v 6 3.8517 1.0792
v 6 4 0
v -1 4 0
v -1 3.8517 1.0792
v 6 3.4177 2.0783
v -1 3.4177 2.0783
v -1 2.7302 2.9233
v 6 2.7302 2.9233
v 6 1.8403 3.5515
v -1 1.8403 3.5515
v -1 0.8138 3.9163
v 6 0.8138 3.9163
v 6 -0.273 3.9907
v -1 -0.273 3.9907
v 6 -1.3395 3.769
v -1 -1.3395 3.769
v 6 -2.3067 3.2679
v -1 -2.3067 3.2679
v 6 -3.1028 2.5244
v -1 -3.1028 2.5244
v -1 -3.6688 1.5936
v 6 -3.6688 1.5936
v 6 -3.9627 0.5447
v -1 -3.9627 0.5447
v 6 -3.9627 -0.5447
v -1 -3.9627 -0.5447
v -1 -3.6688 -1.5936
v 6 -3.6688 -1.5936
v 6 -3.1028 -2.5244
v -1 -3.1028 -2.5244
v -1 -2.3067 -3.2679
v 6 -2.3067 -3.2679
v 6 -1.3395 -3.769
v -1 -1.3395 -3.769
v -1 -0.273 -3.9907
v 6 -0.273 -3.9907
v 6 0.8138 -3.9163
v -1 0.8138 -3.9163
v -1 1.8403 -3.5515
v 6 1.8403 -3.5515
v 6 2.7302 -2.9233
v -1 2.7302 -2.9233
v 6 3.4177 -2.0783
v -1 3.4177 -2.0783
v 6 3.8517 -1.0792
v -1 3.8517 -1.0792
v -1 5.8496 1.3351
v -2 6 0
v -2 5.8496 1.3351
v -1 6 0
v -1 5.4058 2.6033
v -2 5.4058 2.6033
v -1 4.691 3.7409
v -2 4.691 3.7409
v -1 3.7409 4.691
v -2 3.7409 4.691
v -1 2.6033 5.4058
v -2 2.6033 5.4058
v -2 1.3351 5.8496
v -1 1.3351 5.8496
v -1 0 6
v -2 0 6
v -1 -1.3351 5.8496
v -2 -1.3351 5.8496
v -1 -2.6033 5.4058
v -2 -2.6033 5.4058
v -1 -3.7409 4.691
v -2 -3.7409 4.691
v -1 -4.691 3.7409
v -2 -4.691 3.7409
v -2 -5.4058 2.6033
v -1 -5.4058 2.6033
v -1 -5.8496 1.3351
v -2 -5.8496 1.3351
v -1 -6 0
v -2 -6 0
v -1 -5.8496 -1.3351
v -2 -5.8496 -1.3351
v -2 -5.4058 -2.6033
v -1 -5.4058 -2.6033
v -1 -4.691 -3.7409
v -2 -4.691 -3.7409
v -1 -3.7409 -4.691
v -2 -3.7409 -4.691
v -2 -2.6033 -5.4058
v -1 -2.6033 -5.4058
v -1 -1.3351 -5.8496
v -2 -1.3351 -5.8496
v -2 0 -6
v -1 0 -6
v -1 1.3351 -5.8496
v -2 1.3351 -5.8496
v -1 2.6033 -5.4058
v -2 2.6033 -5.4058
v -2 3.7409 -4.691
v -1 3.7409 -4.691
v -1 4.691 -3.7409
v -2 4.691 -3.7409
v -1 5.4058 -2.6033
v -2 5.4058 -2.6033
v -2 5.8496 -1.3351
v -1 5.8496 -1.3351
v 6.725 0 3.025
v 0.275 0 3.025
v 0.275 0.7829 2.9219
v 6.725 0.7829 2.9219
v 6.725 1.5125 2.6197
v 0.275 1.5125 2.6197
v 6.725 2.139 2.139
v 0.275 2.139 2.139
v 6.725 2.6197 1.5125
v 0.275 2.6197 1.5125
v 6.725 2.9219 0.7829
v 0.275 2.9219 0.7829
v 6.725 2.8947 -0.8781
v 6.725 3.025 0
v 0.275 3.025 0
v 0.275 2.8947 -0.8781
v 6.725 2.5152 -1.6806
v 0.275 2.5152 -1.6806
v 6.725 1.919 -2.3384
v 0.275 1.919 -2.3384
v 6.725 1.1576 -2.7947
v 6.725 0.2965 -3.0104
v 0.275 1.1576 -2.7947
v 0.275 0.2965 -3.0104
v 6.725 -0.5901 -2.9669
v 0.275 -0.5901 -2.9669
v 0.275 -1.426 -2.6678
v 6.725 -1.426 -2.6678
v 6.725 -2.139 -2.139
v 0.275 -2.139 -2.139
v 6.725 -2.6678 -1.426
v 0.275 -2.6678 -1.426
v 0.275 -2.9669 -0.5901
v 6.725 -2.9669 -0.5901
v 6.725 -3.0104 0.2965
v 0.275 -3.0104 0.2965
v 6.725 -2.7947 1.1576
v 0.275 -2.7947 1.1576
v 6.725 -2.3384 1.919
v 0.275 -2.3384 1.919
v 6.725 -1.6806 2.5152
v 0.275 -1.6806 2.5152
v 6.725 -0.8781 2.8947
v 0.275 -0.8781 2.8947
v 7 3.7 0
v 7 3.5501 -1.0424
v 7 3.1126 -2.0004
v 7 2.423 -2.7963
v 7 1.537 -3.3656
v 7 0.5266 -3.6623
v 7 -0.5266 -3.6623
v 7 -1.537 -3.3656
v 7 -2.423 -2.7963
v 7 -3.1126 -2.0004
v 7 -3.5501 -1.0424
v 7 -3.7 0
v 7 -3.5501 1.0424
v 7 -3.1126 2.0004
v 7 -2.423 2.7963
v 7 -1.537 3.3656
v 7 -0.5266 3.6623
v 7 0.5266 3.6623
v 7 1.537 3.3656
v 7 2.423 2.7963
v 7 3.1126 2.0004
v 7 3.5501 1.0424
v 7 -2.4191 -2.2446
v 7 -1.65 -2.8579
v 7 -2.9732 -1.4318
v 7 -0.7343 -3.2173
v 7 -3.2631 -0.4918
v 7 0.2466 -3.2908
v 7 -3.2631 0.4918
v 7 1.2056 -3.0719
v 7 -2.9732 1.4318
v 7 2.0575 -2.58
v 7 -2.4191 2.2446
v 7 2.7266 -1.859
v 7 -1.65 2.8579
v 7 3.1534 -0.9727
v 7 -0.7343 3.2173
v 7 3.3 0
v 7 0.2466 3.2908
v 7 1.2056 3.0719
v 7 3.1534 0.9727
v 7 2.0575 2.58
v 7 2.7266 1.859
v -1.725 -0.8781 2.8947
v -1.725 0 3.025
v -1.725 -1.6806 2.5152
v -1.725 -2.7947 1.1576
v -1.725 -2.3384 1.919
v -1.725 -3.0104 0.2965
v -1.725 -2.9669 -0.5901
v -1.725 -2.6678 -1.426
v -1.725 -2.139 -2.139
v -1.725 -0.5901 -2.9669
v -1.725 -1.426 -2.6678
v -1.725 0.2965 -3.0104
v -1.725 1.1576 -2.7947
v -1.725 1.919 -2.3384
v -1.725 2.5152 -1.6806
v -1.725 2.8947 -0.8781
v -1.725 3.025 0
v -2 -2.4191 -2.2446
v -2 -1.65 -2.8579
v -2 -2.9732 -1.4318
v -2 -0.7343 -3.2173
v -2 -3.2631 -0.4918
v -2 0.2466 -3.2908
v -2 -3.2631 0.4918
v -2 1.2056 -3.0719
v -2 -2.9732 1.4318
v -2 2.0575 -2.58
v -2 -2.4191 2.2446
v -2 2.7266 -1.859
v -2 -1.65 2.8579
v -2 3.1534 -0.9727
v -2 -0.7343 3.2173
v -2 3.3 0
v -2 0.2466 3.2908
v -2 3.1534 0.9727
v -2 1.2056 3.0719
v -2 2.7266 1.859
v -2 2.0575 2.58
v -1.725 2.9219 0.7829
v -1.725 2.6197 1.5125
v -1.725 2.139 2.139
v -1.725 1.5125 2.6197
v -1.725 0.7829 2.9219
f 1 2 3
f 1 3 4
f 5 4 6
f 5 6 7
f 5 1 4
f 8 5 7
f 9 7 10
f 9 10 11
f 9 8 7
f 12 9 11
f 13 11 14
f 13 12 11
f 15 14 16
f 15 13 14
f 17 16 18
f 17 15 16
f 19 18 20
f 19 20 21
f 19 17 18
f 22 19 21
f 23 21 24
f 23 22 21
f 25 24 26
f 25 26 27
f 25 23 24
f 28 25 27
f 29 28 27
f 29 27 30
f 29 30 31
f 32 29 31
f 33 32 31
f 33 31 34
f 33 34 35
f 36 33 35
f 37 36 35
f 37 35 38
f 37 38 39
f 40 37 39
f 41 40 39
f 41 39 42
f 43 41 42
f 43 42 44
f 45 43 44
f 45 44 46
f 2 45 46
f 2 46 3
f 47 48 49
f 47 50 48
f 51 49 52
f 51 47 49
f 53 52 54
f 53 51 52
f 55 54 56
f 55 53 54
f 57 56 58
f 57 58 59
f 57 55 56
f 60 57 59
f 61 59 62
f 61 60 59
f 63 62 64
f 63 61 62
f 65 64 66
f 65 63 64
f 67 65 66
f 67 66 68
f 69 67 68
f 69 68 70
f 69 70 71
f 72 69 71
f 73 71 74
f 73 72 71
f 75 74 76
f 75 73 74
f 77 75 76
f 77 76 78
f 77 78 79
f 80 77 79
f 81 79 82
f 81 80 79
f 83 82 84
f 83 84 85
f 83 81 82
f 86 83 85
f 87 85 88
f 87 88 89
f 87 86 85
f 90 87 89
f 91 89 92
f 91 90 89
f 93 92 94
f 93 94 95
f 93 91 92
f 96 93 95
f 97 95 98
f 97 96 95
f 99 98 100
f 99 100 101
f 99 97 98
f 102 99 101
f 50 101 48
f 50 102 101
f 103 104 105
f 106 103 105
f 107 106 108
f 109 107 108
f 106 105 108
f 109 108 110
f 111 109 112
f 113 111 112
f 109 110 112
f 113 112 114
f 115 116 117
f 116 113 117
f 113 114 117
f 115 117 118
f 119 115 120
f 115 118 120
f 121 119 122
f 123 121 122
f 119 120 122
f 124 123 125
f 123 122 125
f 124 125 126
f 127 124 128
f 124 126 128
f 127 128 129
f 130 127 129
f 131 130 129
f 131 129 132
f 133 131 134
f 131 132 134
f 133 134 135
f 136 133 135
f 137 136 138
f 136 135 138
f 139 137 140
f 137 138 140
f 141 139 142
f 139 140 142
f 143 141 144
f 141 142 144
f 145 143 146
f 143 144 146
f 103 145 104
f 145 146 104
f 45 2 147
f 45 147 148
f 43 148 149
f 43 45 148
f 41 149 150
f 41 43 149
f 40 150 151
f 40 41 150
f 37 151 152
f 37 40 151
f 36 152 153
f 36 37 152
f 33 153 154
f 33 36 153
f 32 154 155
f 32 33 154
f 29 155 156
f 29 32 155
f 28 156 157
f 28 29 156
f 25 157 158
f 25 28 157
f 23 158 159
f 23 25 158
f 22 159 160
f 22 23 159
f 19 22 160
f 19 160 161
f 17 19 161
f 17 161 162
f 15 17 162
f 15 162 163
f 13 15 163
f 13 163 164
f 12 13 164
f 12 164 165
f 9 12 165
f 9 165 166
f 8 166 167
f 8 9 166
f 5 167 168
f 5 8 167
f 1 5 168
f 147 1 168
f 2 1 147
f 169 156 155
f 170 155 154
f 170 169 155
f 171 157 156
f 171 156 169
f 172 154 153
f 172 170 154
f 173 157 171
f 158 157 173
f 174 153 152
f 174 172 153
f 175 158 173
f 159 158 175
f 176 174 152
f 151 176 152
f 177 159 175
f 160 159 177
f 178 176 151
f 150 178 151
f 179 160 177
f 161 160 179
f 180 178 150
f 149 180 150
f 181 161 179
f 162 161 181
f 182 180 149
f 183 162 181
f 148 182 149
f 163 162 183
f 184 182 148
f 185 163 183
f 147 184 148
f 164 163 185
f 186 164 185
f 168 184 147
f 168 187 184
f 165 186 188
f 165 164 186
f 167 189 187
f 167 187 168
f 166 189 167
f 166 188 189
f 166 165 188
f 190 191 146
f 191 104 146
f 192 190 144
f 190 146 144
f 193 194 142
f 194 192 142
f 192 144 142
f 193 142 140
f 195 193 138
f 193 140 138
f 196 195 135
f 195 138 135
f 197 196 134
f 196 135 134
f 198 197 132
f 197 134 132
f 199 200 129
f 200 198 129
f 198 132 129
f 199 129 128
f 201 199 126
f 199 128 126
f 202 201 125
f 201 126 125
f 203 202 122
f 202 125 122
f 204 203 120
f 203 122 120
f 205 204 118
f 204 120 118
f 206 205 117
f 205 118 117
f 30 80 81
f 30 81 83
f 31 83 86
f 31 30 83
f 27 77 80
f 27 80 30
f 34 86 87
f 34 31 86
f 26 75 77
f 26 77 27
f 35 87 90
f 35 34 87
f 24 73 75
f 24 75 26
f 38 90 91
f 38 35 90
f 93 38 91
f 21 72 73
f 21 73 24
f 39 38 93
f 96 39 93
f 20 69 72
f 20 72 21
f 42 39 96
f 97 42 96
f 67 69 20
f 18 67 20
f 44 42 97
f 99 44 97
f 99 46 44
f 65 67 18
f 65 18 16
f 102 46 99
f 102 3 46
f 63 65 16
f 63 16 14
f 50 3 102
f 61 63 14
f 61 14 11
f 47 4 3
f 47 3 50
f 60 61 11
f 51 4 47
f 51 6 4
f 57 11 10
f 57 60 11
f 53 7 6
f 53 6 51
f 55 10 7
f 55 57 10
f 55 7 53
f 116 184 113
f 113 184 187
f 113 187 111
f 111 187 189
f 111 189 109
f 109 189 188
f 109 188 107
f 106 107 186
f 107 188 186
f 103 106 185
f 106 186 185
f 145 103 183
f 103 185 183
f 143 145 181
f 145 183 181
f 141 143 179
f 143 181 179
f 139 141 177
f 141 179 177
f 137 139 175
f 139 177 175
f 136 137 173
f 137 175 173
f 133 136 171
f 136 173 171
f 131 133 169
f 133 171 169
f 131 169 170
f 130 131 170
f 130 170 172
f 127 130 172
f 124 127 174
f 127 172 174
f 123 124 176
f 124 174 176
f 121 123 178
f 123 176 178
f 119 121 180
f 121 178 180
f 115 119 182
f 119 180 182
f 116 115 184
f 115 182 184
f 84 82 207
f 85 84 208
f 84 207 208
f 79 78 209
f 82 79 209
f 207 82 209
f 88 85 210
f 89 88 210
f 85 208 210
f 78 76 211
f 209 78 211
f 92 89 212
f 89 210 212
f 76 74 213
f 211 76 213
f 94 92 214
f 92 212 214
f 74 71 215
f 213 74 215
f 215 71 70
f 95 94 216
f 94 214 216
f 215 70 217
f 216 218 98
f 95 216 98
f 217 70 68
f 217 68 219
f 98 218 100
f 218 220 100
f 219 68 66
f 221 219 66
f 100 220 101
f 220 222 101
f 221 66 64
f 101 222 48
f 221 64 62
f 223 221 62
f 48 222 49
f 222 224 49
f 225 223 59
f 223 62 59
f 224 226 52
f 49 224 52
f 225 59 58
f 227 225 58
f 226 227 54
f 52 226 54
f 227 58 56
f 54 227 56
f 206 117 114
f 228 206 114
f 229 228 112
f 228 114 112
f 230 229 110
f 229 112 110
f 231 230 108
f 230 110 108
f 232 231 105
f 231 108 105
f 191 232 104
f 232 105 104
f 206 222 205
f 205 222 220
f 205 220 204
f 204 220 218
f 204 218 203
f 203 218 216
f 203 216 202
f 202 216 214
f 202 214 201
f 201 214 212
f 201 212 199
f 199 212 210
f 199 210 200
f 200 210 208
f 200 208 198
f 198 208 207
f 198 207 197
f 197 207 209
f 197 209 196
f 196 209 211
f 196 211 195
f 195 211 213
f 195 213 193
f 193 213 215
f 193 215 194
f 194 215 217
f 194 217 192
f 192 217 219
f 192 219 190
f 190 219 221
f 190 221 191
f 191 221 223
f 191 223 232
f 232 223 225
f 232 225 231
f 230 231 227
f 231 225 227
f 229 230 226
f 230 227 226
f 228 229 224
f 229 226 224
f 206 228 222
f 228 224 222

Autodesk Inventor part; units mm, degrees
ref_plane "YZ Plane" through (0, 0, 0) normal (1, 0, 0) x (0, 1, 0)
ref_plane "XZ Plane" through (0, 0, 0) normal (0, 1, 0) x (-1, 0, 0)
ref_plane "XY Plane" through (0, 0, 0) normal (0, 0, 1) x (1, 0, 0)
sketch "Sketch_1" plane through (0, 0, 0) normal (0, 0, 1) x (1, 0, 0)
  line L0 (7, 0) -> (0, 0)
  line L1 (0, 3.3) -> (0.3, 3)
  line L2 (0.3, 3) -> (6.7, 3)
  line L3 (6.7, 3) -> (7, 3.3)
  line L4 (7, 3.3) -> (7, 3.7)
  line L5 (7, 3.7) -> (6, 4)
  line L6 (6, 4) -> (1, 4)
  line L7 (1, 4) -> (1, 6)
  line L8 (1, 6) -> (0, 6)
  line L9 (0, 6) -> (0, 3.3)
revolve "Revolution1" add sketch "Sketch_1" angle 360 about axis through (7, 0, 0) along (1, 0, 0)
sketch "스케치2" plane through (0, 0, 0) normal (-1, 0, 0) x (0, 0, 1)
  circle A0 centre (0, 0) radius 3.3 projected
  circle A1 centre (0, 0) radius 6 projected
  circle A2 centre (0, 0) radius 3.025
  dimension "d1" = 6.05
extrude "돌출1" cut sketch "스케치2" against normal up to surface (7 mm away) contours A2
move faces "이동1" translate (-2, 0, 0) faces at (0, 5.0099, -0.7419) (0.0917, 3.1979, -0.2582) (1, 5.2365, -0.7977) (0.6667, 5.9223, -0.9625)
properties part number "80F-0608"
